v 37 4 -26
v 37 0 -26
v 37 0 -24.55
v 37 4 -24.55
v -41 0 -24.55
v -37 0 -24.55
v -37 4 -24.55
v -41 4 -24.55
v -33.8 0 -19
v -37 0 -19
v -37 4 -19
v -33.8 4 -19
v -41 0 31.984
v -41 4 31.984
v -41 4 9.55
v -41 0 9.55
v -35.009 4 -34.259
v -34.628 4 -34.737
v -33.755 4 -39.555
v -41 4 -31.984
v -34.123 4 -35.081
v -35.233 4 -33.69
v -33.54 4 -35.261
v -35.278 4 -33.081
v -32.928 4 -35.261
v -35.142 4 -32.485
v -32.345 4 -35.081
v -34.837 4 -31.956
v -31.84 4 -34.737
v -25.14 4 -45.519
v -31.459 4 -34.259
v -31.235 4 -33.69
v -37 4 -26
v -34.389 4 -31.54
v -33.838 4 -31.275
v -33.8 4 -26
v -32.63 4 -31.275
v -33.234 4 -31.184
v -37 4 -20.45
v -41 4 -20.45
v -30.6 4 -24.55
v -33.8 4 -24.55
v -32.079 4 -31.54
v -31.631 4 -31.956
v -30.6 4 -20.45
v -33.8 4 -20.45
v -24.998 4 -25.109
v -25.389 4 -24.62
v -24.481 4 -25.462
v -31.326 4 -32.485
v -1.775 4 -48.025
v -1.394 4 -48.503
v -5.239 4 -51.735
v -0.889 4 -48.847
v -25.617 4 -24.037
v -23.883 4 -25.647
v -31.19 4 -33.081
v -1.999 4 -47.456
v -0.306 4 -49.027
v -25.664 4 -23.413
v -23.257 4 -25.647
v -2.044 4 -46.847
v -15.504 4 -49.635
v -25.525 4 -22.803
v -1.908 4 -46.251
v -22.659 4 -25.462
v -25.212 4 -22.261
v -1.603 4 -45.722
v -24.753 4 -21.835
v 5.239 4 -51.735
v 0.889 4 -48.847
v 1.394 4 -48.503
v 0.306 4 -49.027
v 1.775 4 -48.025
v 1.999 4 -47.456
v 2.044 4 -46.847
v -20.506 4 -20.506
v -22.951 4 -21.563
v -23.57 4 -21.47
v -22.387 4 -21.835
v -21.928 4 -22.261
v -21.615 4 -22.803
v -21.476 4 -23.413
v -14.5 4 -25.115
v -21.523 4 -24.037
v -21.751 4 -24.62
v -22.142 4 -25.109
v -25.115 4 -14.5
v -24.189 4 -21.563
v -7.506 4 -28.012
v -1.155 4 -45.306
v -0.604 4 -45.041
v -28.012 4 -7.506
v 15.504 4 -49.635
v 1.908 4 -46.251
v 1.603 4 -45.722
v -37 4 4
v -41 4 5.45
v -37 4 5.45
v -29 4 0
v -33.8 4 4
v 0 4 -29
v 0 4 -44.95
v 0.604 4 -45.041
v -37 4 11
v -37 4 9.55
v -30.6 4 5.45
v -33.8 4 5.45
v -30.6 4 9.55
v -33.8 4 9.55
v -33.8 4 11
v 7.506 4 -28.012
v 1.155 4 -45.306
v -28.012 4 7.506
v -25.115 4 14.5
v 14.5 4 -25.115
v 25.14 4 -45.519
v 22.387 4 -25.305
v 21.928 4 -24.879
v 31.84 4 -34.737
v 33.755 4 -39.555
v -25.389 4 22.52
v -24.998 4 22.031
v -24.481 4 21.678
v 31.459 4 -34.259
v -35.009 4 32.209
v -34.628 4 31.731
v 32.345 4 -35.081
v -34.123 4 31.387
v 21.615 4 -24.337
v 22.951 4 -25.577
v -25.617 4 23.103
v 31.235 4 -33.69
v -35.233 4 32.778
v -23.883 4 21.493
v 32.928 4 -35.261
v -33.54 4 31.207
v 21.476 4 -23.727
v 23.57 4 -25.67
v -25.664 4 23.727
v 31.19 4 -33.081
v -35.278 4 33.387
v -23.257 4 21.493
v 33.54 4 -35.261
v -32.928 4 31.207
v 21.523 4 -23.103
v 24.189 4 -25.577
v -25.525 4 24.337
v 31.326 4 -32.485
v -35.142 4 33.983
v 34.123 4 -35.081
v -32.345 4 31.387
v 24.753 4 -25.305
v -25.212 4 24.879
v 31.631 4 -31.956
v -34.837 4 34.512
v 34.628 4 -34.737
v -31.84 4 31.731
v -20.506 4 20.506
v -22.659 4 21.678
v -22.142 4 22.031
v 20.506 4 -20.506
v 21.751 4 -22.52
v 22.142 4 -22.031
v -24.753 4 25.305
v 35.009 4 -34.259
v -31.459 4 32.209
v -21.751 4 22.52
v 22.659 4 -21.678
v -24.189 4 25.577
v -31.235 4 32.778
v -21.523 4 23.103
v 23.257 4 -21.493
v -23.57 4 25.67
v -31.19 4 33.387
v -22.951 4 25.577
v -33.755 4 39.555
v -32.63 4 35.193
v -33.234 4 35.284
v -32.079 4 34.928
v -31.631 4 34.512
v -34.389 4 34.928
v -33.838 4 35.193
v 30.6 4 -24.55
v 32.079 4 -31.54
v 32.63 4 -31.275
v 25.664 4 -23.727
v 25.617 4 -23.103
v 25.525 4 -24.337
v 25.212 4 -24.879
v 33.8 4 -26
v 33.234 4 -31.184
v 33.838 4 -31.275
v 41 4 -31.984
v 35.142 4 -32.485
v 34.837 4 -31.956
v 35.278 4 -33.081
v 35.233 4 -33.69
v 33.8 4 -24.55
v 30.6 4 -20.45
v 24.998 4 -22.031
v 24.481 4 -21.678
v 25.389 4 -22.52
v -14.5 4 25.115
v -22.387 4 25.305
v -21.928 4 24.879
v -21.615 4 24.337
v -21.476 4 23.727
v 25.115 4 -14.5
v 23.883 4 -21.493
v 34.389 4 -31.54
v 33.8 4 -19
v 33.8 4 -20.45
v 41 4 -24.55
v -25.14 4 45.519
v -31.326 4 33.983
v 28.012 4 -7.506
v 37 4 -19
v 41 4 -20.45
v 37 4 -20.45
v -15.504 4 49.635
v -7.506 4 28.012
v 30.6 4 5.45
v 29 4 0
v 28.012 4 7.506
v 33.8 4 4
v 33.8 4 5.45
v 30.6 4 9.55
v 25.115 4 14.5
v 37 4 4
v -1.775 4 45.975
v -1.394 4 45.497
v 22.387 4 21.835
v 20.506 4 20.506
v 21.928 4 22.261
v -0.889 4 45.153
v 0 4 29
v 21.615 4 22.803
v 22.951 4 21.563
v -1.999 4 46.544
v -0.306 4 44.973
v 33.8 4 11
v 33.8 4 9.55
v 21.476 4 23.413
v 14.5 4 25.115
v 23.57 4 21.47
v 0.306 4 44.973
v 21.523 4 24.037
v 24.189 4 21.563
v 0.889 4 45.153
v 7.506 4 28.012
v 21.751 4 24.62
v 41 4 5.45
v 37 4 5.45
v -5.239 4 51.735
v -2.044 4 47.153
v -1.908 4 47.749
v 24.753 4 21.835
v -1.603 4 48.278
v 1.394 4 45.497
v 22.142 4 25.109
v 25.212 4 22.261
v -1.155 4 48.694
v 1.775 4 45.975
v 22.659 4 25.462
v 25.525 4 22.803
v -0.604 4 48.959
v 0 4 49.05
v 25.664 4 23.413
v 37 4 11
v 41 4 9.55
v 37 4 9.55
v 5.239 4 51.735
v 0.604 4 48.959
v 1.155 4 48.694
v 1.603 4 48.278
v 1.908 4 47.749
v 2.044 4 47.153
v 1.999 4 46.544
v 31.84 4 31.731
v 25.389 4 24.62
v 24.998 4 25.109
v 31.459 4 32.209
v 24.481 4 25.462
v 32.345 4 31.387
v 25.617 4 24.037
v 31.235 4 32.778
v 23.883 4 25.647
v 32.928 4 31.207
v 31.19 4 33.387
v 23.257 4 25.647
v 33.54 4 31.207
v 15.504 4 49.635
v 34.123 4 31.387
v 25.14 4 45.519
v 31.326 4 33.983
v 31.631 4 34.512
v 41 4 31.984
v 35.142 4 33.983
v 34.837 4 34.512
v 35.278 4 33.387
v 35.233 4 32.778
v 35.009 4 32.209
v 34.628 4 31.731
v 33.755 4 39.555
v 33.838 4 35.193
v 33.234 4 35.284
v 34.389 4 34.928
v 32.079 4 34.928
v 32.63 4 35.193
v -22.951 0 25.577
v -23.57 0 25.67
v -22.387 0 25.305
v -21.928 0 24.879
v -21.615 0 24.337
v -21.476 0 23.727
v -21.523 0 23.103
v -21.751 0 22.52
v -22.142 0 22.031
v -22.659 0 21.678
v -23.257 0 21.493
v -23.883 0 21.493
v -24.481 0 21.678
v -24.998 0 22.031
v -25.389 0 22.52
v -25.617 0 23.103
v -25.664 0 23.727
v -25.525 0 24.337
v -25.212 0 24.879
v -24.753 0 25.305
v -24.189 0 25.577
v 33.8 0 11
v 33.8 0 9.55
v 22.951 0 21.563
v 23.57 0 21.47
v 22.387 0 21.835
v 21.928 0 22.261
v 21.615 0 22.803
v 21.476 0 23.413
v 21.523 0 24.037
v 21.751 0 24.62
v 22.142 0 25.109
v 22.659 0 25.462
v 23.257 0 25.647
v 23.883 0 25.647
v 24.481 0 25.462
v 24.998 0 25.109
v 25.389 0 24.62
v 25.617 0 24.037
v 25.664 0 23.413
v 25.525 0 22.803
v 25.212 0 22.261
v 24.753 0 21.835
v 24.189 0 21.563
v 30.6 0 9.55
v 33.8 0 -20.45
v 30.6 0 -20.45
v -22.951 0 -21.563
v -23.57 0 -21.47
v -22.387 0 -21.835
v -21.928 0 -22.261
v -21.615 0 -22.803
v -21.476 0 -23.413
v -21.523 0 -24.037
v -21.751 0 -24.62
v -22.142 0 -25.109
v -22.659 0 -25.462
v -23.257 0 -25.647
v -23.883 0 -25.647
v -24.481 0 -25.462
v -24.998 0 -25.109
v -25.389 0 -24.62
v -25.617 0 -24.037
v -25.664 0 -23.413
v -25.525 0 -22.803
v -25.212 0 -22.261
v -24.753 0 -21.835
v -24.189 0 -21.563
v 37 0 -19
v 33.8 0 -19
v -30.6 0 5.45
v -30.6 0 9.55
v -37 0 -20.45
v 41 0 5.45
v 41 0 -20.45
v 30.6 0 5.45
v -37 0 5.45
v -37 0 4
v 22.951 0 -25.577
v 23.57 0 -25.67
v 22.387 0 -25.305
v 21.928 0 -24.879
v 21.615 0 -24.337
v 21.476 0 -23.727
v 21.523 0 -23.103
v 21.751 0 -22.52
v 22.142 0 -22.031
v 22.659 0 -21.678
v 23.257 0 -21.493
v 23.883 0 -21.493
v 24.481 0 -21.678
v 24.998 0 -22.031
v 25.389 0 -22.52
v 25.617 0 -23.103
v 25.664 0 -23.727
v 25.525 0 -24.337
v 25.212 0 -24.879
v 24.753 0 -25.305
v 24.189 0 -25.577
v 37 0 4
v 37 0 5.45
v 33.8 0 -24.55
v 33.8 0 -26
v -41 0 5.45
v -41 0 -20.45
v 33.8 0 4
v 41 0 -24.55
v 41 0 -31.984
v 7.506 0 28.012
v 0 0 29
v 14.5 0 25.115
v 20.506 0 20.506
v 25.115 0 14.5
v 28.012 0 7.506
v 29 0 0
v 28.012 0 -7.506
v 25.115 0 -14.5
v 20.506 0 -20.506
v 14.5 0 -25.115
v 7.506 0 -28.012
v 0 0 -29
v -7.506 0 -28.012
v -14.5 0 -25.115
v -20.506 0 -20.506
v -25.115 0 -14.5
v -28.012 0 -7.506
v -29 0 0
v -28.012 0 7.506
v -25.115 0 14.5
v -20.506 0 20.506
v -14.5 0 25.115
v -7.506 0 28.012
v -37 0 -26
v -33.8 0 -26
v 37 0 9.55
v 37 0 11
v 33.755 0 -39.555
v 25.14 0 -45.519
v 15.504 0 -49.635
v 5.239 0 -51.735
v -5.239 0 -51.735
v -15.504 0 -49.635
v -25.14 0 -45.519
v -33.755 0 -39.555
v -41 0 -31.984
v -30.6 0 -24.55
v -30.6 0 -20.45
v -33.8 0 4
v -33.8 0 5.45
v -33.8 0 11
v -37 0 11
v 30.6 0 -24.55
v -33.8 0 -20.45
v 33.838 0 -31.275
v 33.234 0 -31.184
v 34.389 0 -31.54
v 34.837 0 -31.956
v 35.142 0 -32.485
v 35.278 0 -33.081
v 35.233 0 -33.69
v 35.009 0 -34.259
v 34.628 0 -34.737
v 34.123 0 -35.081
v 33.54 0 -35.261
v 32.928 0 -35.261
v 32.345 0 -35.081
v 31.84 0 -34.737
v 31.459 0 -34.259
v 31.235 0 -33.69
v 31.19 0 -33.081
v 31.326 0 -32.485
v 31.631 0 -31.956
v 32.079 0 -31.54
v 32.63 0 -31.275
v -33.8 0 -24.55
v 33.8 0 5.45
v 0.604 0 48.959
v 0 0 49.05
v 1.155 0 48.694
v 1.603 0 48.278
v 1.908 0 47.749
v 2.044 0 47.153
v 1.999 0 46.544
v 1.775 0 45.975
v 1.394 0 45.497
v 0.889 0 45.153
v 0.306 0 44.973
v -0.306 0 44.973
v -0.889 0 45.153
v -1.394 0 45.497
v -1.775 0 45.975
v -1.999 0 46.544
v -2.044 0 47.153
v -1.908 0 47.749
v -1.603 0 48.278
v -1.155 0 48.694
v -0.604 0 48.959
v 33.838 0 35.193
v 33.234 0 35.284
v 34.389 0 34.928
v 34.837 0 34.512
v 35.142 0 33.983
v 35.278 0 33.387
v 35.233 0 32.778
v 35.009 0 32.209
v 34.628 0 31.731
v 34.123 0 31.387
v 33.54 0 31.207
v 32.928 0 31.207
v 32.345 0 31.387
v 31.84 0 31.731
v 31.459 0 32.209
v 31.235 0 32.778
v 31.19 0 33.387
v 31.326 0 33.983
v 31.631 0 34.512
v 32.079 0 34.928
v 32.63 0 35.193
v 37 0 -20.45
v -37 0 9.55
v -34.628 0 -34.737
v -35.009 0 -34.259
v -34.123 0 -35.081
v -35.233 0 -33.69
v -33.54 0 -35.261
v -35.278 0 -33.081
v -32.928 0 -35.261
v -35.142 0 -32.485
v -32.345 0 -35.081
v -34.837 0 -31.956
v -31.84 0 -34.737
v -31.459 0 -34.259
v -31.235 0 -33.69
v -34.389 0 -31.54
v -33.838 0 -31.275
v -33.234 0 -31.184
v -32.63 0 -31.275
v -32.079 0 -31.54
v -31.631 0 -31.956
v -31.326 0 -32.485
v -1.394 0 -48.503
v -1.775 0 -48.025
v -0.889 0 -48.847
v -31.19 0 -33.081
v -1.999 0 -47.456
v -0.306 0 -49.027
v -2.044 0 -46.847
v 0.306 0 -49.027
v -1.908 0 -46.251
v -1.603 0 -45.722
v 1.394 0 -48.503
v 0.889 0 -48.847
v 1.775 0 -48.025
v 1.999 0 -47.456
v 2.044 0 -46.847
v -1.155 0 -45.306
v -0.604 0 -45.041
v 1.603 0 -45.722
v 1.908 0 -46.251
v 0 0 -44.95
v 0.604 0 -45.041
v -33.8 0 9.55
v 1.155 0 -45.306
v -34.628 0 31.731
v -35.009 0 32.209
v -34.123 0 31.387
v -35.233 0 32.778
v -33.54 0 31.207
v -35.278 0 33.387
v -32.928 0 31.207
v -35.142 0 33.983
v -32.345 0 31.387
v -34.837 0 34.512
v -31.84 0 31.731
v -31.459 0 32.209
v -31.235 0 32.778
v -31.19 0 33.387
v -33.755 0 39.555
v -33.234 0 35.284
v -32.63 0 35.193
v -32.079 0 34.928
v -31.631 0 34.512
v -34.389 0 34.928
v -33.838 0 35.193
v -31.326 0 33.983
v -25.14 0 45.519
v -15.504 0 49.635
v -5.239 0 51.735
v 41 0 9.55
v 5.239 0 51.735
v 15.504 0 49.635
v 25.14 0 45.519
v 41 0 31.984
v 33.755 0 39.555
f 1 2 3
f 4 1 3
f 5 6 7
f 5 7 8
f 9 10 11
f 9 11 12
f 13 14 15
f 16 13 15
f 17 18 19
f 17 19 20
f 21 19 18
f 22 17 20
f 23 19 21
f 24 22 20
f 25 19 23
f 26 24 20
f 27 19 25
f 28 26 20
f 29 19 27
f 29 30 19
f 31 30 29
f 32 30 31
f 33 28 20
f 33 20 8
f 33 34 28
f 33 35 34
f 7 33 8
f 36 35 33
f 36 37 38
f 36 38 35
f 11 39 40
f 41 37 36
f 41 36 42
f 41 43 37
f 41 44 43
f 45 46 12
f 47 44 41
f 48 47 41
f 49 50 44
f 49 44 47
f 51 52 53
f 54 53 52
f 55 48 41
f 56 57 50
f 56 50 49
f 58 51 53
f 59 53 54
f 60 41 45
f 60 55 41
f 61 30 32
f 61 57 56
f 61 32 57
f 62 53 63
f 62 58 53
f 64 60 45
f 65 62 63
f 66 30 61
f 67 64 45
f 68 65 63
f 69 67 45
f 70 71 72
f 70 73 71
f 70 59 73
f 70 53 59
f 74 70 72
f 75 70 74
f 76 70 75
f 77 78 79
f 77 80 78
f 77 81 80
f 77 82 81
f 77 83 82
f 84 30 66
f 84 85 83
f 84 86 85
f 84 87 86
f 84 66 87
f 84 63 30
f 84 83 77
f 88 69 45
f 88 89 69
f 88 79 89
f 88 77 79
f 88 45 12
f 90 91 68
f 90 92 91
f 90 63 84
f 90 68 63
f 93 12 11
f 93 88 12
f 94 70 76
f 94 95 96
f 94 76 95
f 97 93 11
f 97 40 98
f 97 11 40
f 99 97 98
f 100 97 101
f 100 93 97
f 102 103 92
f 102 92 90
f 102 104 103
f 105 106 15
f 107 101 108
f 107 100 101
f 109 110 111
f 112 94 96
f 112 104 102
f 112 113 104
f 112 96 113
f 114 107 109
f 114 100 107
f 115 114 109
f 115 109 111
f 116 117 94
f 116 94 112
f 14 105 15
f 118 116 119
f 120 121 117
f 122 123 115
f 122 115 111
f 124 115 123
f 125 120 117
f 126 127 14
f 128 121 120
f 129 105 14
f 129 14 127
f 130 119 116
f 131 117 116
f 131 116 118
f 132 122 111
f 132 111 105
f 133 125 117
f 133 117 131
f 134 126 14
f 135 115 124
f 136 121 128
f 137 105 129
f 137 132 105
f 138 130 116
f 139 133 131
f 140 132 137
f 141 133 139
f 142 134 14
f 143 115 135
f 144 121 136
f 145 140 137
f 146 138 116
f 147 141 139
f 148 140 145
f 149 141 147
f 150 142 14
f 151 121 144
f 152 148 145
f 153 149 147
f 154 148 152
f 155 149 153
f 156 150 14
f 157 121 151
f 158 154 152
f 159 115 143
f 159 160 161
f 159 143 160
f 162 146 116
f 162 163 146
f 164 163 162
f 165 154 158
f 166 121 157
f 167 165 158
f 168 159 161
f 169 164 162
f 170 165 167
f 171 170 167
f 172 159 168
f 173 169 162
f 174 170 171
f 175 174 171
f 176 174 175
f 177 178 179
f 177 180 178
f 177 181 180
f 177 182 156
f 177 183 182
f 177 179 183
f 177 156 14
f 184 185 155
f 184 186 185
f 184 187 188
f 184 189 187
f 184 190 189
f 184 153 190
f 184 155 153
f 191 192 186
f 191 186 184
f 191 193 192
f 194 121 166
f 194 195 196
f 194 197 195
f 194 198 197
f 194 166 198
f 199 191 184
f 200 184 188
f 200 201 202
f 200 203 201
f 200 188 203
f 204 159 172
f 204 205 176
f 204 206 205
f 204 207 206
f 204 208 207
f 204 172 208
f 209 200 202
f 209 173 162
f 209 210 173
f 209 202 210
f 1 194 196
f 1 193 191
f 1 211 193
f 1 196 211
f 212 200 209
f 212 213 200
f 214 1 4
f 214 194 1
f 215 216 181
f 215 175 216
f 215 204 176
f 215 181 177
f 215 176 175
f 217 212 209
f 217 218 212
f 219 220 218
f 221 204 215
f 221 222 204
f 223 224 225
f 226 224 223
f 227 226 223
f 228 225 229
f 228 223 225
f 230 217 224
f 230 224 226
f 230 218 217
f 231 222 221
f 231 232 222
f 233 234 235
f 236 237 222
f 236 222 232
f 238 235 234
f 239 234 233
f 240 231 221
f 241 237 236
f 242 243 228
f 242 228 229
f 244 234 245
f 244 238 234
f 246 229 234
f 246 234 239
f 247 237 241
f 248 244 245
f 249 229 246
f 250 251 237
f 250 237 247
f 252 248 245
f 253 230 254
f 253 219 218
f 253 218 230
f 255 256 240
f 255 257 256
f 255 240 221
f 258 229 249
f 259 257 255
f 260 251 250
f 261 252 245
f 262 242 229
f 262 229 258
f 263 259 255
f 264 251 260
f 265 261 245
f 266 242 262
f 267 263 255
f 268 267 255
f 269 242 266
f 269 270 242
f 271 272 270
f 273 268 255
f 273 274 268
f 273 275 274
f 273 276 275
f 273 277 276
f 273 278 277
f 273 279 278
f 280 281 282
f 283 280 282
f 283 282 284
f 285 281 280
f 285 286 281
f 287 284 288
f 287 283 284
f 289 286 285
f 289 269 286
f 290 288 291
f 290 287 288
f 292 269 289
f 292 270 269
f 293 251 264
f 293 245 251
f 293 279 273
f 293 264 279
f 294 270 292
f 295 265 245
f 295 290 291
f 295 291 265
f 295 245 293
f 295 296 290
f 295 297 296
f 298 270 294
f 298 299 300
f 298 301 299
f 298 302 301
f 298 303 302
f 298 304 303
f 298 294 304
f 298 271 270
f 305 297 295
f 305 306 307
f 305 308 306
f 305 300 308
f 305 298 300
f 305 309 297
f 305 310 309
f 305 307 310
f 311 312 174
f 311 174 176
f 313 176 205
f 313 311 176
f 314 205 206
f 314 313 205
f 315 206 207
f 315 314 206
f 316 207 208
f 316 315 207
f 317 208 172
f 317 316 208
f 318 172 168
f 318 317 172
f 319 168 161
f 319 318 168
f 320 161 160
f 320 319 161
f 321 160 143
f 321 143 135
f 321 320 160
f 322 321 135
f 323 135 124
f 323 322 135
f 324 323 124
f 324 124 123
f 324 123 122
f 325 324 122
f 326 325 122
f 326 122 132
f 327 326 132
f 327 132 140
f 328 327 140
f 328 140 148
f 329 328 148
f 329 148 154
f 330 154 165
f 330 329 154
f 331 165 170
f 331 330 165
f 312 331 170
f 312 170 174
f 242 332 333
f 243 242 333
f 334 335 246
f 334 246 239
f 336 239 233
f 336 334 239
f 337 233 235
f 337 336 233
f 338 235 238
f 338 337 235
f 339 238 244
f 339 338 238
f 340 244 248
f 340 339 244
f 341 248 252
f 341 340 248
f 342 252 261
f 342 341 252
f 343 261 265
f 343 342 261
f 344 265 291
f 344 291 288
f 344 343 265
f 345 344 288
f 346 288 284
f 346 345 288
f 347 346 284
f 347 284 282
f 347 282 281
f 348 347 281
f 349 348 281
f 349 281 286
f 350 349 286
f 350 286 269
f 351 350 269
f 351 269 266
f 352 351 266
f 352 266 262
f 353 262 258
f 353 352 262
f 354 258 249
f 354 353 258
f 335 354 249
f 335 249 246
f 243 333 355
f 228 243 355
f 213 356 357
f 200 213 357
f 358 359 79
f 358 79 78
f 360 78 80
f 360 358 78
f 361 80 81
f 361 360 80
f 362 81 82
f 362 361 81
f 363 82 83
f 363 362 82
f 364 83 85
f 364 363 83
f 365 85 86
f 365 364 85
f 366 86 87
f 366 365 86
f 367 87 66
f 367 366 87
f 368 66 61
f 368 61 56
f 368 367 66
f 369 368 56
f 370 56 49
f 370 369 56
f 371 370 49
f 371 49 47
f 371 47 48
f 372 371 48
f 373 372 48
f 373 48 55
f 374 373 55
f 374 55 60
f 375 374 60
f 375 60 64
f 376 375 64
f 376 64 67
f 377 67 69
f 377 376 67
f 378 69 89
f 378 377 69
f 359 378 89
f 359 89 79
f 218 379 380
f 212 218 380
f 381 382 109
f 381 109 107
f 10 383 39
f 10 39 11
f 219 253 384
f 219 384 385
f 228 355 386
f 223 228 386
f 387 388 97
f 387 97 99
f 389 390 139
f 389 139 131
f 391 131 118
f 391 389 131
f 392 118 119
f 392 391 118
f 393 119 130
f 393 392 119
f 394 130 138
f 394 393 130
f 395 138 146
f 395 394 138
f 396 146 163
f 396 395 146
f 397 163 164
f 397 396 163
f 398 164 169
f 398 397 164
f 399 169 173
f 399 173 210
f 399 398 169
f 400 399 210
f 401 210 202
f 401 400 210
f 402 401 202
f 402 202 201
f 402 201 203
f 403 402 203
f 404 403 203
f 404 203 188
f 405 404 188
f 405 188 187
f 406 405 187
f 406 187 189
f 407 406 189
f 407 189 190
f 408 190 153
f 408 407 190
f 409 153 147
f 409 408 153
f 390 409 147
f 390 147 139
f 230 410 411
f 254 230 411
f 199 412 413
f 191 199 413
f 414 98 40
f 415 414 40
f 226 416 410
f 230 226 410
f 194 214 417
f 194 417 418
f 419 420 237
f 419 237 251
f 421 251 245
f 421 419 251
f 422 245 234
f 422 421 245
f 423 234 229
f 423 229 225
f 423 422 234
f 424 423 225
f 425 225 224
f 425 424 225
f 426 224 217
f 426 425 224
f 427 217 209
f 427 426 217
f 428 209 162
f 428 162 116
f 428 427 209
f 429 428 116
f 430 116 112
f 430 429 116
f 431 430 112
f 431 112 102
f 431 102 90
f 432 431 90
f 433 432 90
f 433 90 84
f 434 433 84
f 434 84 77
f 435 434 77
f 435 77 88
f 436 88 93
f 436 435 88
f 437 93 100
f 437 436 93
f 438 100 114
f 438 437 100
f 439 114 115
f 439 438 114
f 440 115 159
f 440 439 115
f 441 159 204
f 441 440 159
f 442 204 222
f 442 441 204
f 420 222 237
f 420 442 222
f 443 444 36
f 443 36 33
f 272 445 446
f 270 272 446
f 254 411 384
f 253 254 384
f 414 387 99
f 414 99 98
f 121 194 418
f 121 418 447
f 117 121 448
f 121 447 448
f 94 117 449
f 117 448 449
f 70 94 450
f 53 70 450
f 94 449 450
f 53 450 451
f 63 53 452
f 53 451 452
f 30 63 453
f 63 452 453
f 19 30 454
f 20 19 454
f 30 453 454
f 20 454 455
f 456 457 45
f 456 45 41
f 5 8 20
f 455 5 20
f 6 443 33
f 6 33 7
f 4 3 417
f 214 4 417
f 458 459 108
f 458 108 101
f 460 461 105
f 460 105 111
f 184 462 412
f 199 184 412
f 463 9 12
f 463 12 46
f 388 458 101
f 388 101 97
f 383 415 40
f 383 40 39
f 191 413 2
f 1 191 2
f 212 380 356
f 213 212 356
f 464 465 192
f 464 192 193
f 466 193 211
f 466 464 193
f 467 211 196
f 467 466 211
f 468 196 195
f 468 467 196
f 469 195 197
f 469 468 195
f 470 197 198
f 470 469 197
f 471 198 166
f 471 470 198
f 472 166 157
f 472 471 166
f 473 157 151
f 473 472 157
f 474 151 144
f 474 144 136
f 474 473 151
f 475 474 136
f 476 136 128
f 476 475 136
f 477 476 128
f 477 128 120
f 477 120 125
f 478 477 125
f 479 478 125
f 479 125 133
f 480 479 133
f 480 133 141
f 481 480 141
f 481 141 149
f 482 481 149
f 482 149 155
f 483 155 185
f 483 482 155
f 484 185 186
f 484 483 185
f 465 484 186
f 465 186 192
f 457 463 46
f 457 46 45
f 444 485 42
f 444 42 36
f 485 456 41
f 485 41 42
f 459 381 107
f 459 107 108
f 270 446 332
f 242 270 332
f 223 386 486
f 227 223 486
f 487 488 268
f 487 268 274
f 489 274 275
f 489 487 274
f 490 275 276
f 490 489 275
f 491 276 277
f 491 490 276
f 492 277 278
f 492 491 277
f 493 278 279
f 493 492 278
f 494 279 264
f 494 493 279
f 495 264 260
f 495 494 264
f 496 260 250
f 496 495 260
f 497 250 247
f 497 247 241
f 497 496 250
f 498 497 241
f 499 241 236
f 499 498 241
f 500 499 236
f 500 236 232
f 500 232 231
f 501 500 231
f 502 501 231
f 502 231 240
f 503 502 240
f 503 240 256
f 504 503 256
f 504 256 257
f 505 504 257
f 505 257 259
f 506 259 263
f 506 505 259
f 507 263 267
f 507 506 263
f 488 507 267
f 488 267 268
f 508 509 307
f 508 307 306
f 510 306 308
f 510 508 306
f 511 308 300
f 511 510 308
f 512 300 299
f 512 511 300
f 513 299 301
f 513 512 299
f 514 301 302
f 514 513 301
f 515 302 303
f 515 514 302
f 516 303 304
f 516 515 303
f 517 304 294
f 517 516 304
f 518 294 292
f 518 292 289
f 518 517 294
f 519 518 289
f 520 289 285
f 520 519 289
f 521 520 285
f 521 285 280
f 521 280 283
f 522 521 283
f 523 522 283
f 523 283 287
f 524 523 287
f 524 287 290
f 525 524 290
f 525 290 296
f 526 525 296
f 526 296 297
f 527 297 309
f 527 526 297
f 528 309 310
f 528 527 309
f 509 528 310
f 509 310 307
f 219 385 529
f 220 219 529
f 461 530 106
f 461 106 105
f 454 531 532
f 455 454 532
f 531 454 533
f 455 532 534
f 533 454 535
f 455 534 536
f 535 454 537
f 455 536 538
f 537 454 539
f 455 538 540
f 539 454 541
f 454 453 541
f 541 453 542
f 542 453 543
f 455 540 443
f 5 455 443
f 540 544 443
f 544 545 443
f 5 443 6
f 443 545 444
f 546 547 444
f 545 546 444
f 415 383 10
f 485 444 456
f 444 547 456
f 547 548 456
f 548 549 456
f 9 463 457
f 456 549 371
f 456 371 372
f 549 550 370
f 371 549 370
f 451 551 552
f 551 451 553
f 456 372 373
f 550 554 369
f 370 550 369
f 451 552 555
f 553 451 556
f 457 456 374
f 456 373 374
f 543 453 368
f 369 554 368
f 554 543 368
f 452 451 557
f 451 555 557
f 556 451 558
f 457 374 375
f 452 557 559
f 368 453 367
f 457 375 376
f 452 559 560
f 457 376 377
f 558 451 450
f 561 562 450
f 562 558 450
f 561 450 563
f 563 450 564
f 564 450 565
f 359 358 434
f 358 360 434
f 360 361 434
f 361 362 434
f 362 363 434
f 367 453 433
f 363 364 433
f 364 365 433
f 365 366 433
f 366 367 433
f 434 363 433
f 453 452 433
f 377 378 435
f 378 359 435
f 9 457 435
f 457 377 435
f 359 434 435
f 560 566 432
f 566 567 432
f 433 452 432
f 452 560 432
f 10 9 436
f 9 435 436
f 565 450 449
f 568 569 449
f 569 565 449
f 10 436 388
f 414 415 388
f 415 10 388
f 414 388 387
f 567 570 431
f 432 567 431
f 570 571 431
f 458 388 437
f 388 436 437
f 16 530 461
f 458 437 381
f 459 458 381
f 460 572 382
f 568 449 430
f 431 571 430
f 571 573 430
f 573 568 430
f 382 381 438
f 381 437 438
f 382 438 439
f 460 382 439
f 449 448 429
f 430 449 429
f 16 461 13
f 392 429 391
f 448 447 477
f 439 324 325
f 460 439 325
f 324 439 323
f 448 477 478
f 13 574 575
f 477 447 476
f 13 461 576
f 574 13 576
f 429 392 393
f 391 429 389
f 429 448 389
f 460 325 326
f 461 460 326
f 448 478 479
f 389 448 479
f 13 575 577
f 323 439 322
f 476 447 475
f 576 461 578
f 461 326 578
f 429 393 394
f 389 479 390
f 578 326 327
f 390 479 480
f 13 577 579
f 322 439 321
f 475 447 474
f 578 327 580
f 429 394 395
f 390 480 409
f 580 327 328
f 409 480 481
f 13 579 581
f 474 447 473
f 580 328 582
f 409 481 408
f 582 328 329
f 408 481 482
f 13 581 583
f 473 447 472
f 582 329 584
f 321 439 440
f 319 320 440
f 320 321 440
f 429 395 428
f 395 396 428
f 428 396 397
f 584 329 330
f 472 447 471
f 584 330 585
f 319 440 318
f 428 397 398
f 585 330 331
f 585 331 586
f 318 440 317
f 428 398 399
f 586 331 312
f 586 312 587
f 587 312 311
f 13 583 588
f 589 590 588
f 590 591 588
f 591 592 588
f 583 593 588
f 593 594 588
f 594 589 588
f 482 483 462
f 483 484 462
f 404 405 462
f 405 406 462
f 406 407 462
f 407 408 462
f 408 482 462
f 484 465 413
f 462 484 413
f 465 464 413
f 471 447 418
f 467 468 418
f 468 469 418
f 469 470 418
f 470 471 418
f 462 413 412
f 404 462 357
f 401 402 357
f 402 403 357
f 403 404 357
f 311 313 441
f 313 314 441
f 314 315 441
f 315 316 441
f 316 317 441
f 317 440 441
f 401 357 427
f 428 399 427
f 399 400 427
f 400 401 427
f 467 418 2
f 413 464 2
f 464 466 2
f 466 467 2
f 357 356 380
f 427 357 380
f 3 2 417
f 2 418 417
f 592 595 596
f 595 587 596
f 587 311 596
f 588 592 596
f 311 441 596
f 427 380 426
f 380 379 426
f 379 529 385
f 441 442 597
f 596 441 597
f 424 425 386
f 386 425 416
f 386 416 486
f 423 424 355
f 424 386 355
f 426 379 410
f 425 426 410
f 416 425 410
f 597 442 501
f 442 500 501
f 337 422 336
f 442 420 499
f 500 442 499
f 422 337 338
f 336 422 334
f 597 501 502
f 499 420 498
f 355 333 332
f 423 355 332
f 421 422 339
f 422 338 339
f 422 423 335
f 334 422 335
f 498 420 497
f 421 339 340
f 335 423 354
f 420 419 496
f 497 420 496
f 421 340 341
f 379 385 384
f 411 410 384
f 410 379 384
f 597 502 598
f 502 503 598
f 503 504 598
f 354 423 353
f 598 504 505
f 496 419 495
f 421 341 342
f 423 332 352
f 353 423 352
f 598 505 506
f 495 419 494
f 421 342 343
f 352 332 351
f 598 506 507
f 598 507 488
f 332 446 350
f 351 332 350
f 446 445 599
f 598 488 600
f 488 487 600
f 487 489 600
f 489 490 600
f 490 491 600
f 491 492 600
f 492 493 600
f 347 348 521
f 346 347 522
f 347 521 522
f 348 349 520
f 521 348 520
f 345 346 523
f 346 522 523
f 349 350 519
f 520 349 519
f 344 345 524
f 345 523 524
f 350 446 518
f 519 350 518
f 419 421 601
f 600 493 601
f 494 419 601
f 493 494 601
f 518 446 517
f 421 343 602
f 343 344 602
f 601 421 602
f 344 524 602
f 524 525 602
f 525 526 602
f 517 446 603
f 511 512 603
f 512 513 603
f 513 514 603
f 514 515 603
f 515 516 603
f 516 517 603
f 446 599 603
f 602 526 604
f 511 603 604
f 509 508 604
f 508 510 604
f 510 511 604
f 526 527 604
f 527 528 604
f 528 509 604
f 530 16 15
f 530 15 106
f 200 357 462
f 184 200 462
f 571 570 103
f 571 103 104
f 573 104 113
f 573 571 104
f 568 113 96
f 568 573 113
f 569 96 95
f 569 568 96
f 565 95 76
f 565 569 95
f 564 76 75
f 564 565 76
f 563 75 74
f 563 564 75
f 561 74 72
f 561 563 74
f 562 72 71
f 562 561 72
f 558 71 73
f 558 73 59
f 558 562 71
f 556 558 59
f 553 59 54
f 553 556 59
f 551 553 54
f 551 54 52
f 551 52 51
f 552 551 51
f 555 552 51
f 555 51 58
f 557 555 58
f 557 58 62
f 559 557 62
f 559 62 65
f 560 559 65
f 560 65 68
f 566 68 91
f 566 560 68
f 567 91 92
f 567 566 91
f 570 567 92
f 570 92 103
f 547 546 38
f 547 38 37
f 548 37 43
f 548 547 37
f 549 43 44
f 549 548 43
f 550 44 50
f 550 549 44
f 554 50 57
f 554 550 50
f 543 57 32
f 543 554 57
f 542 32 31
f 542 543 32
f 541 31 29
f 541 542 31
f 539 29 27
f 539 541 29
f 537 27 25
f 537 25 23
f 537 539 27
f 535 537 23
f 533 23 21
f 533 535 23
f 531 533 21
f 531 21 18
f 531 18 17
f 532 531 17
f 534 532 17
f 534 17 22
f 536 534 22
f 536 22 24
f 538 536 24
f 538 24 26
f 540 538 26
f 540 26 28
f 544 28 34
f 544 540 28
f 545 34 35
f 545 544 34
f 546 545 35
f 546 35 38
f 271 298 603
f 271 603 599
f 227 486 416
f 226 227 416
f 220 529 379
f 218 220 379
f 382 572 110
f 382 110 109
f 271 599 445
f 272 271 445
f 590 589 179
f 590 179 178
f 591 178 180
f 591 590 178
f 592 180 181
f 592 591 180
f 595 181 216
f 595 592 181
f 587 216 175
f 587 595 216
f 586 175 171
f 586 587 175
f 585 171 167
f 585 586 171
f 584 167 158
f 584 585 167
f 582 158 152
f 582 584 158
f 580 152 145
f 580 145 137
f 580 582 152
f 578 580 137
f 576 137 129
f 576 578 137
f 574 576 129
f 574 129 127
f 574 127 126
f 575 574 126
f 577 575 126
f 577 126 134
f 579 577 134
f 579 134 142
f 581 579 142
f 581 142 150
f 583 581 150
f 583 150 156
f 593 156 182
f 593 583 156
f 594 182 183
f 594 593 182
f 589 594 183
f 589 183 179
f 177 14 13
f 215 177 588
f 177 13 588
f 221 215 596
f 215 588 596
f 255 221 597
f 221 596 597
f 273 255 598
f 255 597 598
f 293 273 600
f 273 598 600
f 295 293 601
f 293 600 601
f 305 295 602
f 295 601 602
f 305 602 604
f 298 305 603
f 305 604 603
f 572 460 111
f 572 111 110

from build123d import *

# Parameters (mm, degrees)
SKETCH_1_R          = 52
SKETCH_1_R_2        = 29
SKETCH_1_R_3        = 2.05
SKETCH_1_R_4        = 2.1
EXTRUDE_1_DEPTH     = 4
SKETCH_2_W          = 182
SKETCH_2_H          = 210.035227354
SKETCH_2_W_2        = 82
SKETCH_2_H_2        = 110.035227354
CUT_EXTRUDE_1_DEPTH = 4


with BuildPart() as part:
    # 草图1 → 凸台-拉伸1 (new body)
    with BuildSketch(Plane(origin=(0, 0, 0), x_dir=(1, 0, 0), z_dir=(0, 1, 0))):
        with Locations(Location((0, 0, 0), (0, 0, 270))):
            Circle(SKETCH_1_R)
        with Locations(Location((0, 0, 0), (0, 0, 270))):
            Circle(SKETCH_1_R_2, mode=Mode.SUBTRACT)
        with Locations(Location((47, 0, 0), (0, 0, 270))):
            Circle(SKETCH_1_R_3, mode=Mode.SUBTRACT)
        with Locations(Location((33.234018716, -33.234018716, 0), (0, 0, 270))):
            Circle(SKETCH_1_R_3, mode=Mode.SUBTRACT)
        with Locations(Location((0, -47, 0), (0, 0, 270))):
            Circle(SKETCH_1_R_3, mode=Mode.SUBTRACT)
        with Locations(Location((-33.234018716, -33.234018716, 0), (0, 0, 270))):
            Circle(SKETCH_1_R_3, mode=Mode.SUBTRACT)
        with Locations(Location((-47, 0, 0), (0, 0, 270))):
            Circle(SKETCH_1_R_3, mode=Mode.SUBTRACT)
        with Locations(Location((-33.234018716, 33.234018716, 0), (0, 0, 270))):
            Circle(SKETCH_1_R_3, mode=Mode.SUBTRACT)
        with Locations(Location((0, 47, 0), (0, 0, 270))):
            Circle(SKETCH_1_R_3, mode=Mode.SUBTRACT)
        with Locations(Location((33.234018716, 33.234018716, 0), (0, 0, 270))):
            Circle(SKETCH_1_R_3, mode=Mode.SUBTRACT)
        with Locations(Location((-23.57, 23.57, 0), (0, 0, 270))):
            Circle(SKETCH_1_R_4, mode=Mode.SUBTRACT)
        with Locations(Location((-23.57, -23.57, 0), (0, 0, 270))):
            Circle(SKETCH_1_R_4, mode=Mode.SUBTRACT)
        with Locations(Location((23.57, -23.57, 0), (0, 0, 90))):
            Circle(SKETCH_1_R_4, mode=Mode.SUBTRACT)
        with Locations(Location((23.57, 23.57, 0), (0, 0, 90))):
            Circle(SKETCH_1_R_4, mode=Mode.SUBTRACT)
        Polygon((37, -9.55), (37, -11), (33.8, -11), (33.8, -9.55), (30.6, -9.55), (30.6, -5.45), (33.8, -5.45), (33.8, -4), (37, -4), (37, -5.45), (41, -5.45), (41, -9.55), align=None, mode=Mode.SUBTRACT)
        Polygon((37, 20.45), (37, 19), (33.8, 19), (33.8, 20.45), (30.6, 20.45), (30.6, 24.55), (33.8, 24.55), (33.8, 26), (37, 26), (37, 24.55), (41, 24.55), (41, 20.45), align=None, mode=Mode.SUBTRACT)
        Polygon((-33.8, 26), (-37, 26), (-37, 24.55), (-41, 24.55), (-41, 20.45), (-37, 20.45), (-37, 19), (-33.8, 19), (-33.8, 20.45), (-30.6, 20.45), (-30.6, 24.55), (-33.8, 24.55), align=None, mode=Mode.SUBTRACT)
        Polygon((-33.8, -4), (-37, -4), (-37, -5.45), (-41, -5.45), (-41, -9.55), (-37, -9.55), (-37, -11), (-33.8, -11), (-33.8, -9.55), (-30.6, -9.55), (-30.6, -5.45), (-33.8, -5.45), align=None, mode=Mode.SUBTRACT)
    extrude(amount=EXTRUDE_1_DEPTH)

    # 草图2 → 切除-拉伸-薄壁1 (cut)
    with BuildSketch(Plane(origin=(0, 4, 0), x_dir=(1, 0, 0), z_dir=(0, 1, 0))):
        Rectangle(SKETCH_2_W, SKETCH_2_H)
        Rectangle(SKETCH_2_W_2, SKETCH_2_H_2, mode=Mode.SUBTRACT)
    extrude(amount=-CUT_EXTRUDE_1_DEPTH, mode=Mode.SUBTRACT)


solid = part.part
